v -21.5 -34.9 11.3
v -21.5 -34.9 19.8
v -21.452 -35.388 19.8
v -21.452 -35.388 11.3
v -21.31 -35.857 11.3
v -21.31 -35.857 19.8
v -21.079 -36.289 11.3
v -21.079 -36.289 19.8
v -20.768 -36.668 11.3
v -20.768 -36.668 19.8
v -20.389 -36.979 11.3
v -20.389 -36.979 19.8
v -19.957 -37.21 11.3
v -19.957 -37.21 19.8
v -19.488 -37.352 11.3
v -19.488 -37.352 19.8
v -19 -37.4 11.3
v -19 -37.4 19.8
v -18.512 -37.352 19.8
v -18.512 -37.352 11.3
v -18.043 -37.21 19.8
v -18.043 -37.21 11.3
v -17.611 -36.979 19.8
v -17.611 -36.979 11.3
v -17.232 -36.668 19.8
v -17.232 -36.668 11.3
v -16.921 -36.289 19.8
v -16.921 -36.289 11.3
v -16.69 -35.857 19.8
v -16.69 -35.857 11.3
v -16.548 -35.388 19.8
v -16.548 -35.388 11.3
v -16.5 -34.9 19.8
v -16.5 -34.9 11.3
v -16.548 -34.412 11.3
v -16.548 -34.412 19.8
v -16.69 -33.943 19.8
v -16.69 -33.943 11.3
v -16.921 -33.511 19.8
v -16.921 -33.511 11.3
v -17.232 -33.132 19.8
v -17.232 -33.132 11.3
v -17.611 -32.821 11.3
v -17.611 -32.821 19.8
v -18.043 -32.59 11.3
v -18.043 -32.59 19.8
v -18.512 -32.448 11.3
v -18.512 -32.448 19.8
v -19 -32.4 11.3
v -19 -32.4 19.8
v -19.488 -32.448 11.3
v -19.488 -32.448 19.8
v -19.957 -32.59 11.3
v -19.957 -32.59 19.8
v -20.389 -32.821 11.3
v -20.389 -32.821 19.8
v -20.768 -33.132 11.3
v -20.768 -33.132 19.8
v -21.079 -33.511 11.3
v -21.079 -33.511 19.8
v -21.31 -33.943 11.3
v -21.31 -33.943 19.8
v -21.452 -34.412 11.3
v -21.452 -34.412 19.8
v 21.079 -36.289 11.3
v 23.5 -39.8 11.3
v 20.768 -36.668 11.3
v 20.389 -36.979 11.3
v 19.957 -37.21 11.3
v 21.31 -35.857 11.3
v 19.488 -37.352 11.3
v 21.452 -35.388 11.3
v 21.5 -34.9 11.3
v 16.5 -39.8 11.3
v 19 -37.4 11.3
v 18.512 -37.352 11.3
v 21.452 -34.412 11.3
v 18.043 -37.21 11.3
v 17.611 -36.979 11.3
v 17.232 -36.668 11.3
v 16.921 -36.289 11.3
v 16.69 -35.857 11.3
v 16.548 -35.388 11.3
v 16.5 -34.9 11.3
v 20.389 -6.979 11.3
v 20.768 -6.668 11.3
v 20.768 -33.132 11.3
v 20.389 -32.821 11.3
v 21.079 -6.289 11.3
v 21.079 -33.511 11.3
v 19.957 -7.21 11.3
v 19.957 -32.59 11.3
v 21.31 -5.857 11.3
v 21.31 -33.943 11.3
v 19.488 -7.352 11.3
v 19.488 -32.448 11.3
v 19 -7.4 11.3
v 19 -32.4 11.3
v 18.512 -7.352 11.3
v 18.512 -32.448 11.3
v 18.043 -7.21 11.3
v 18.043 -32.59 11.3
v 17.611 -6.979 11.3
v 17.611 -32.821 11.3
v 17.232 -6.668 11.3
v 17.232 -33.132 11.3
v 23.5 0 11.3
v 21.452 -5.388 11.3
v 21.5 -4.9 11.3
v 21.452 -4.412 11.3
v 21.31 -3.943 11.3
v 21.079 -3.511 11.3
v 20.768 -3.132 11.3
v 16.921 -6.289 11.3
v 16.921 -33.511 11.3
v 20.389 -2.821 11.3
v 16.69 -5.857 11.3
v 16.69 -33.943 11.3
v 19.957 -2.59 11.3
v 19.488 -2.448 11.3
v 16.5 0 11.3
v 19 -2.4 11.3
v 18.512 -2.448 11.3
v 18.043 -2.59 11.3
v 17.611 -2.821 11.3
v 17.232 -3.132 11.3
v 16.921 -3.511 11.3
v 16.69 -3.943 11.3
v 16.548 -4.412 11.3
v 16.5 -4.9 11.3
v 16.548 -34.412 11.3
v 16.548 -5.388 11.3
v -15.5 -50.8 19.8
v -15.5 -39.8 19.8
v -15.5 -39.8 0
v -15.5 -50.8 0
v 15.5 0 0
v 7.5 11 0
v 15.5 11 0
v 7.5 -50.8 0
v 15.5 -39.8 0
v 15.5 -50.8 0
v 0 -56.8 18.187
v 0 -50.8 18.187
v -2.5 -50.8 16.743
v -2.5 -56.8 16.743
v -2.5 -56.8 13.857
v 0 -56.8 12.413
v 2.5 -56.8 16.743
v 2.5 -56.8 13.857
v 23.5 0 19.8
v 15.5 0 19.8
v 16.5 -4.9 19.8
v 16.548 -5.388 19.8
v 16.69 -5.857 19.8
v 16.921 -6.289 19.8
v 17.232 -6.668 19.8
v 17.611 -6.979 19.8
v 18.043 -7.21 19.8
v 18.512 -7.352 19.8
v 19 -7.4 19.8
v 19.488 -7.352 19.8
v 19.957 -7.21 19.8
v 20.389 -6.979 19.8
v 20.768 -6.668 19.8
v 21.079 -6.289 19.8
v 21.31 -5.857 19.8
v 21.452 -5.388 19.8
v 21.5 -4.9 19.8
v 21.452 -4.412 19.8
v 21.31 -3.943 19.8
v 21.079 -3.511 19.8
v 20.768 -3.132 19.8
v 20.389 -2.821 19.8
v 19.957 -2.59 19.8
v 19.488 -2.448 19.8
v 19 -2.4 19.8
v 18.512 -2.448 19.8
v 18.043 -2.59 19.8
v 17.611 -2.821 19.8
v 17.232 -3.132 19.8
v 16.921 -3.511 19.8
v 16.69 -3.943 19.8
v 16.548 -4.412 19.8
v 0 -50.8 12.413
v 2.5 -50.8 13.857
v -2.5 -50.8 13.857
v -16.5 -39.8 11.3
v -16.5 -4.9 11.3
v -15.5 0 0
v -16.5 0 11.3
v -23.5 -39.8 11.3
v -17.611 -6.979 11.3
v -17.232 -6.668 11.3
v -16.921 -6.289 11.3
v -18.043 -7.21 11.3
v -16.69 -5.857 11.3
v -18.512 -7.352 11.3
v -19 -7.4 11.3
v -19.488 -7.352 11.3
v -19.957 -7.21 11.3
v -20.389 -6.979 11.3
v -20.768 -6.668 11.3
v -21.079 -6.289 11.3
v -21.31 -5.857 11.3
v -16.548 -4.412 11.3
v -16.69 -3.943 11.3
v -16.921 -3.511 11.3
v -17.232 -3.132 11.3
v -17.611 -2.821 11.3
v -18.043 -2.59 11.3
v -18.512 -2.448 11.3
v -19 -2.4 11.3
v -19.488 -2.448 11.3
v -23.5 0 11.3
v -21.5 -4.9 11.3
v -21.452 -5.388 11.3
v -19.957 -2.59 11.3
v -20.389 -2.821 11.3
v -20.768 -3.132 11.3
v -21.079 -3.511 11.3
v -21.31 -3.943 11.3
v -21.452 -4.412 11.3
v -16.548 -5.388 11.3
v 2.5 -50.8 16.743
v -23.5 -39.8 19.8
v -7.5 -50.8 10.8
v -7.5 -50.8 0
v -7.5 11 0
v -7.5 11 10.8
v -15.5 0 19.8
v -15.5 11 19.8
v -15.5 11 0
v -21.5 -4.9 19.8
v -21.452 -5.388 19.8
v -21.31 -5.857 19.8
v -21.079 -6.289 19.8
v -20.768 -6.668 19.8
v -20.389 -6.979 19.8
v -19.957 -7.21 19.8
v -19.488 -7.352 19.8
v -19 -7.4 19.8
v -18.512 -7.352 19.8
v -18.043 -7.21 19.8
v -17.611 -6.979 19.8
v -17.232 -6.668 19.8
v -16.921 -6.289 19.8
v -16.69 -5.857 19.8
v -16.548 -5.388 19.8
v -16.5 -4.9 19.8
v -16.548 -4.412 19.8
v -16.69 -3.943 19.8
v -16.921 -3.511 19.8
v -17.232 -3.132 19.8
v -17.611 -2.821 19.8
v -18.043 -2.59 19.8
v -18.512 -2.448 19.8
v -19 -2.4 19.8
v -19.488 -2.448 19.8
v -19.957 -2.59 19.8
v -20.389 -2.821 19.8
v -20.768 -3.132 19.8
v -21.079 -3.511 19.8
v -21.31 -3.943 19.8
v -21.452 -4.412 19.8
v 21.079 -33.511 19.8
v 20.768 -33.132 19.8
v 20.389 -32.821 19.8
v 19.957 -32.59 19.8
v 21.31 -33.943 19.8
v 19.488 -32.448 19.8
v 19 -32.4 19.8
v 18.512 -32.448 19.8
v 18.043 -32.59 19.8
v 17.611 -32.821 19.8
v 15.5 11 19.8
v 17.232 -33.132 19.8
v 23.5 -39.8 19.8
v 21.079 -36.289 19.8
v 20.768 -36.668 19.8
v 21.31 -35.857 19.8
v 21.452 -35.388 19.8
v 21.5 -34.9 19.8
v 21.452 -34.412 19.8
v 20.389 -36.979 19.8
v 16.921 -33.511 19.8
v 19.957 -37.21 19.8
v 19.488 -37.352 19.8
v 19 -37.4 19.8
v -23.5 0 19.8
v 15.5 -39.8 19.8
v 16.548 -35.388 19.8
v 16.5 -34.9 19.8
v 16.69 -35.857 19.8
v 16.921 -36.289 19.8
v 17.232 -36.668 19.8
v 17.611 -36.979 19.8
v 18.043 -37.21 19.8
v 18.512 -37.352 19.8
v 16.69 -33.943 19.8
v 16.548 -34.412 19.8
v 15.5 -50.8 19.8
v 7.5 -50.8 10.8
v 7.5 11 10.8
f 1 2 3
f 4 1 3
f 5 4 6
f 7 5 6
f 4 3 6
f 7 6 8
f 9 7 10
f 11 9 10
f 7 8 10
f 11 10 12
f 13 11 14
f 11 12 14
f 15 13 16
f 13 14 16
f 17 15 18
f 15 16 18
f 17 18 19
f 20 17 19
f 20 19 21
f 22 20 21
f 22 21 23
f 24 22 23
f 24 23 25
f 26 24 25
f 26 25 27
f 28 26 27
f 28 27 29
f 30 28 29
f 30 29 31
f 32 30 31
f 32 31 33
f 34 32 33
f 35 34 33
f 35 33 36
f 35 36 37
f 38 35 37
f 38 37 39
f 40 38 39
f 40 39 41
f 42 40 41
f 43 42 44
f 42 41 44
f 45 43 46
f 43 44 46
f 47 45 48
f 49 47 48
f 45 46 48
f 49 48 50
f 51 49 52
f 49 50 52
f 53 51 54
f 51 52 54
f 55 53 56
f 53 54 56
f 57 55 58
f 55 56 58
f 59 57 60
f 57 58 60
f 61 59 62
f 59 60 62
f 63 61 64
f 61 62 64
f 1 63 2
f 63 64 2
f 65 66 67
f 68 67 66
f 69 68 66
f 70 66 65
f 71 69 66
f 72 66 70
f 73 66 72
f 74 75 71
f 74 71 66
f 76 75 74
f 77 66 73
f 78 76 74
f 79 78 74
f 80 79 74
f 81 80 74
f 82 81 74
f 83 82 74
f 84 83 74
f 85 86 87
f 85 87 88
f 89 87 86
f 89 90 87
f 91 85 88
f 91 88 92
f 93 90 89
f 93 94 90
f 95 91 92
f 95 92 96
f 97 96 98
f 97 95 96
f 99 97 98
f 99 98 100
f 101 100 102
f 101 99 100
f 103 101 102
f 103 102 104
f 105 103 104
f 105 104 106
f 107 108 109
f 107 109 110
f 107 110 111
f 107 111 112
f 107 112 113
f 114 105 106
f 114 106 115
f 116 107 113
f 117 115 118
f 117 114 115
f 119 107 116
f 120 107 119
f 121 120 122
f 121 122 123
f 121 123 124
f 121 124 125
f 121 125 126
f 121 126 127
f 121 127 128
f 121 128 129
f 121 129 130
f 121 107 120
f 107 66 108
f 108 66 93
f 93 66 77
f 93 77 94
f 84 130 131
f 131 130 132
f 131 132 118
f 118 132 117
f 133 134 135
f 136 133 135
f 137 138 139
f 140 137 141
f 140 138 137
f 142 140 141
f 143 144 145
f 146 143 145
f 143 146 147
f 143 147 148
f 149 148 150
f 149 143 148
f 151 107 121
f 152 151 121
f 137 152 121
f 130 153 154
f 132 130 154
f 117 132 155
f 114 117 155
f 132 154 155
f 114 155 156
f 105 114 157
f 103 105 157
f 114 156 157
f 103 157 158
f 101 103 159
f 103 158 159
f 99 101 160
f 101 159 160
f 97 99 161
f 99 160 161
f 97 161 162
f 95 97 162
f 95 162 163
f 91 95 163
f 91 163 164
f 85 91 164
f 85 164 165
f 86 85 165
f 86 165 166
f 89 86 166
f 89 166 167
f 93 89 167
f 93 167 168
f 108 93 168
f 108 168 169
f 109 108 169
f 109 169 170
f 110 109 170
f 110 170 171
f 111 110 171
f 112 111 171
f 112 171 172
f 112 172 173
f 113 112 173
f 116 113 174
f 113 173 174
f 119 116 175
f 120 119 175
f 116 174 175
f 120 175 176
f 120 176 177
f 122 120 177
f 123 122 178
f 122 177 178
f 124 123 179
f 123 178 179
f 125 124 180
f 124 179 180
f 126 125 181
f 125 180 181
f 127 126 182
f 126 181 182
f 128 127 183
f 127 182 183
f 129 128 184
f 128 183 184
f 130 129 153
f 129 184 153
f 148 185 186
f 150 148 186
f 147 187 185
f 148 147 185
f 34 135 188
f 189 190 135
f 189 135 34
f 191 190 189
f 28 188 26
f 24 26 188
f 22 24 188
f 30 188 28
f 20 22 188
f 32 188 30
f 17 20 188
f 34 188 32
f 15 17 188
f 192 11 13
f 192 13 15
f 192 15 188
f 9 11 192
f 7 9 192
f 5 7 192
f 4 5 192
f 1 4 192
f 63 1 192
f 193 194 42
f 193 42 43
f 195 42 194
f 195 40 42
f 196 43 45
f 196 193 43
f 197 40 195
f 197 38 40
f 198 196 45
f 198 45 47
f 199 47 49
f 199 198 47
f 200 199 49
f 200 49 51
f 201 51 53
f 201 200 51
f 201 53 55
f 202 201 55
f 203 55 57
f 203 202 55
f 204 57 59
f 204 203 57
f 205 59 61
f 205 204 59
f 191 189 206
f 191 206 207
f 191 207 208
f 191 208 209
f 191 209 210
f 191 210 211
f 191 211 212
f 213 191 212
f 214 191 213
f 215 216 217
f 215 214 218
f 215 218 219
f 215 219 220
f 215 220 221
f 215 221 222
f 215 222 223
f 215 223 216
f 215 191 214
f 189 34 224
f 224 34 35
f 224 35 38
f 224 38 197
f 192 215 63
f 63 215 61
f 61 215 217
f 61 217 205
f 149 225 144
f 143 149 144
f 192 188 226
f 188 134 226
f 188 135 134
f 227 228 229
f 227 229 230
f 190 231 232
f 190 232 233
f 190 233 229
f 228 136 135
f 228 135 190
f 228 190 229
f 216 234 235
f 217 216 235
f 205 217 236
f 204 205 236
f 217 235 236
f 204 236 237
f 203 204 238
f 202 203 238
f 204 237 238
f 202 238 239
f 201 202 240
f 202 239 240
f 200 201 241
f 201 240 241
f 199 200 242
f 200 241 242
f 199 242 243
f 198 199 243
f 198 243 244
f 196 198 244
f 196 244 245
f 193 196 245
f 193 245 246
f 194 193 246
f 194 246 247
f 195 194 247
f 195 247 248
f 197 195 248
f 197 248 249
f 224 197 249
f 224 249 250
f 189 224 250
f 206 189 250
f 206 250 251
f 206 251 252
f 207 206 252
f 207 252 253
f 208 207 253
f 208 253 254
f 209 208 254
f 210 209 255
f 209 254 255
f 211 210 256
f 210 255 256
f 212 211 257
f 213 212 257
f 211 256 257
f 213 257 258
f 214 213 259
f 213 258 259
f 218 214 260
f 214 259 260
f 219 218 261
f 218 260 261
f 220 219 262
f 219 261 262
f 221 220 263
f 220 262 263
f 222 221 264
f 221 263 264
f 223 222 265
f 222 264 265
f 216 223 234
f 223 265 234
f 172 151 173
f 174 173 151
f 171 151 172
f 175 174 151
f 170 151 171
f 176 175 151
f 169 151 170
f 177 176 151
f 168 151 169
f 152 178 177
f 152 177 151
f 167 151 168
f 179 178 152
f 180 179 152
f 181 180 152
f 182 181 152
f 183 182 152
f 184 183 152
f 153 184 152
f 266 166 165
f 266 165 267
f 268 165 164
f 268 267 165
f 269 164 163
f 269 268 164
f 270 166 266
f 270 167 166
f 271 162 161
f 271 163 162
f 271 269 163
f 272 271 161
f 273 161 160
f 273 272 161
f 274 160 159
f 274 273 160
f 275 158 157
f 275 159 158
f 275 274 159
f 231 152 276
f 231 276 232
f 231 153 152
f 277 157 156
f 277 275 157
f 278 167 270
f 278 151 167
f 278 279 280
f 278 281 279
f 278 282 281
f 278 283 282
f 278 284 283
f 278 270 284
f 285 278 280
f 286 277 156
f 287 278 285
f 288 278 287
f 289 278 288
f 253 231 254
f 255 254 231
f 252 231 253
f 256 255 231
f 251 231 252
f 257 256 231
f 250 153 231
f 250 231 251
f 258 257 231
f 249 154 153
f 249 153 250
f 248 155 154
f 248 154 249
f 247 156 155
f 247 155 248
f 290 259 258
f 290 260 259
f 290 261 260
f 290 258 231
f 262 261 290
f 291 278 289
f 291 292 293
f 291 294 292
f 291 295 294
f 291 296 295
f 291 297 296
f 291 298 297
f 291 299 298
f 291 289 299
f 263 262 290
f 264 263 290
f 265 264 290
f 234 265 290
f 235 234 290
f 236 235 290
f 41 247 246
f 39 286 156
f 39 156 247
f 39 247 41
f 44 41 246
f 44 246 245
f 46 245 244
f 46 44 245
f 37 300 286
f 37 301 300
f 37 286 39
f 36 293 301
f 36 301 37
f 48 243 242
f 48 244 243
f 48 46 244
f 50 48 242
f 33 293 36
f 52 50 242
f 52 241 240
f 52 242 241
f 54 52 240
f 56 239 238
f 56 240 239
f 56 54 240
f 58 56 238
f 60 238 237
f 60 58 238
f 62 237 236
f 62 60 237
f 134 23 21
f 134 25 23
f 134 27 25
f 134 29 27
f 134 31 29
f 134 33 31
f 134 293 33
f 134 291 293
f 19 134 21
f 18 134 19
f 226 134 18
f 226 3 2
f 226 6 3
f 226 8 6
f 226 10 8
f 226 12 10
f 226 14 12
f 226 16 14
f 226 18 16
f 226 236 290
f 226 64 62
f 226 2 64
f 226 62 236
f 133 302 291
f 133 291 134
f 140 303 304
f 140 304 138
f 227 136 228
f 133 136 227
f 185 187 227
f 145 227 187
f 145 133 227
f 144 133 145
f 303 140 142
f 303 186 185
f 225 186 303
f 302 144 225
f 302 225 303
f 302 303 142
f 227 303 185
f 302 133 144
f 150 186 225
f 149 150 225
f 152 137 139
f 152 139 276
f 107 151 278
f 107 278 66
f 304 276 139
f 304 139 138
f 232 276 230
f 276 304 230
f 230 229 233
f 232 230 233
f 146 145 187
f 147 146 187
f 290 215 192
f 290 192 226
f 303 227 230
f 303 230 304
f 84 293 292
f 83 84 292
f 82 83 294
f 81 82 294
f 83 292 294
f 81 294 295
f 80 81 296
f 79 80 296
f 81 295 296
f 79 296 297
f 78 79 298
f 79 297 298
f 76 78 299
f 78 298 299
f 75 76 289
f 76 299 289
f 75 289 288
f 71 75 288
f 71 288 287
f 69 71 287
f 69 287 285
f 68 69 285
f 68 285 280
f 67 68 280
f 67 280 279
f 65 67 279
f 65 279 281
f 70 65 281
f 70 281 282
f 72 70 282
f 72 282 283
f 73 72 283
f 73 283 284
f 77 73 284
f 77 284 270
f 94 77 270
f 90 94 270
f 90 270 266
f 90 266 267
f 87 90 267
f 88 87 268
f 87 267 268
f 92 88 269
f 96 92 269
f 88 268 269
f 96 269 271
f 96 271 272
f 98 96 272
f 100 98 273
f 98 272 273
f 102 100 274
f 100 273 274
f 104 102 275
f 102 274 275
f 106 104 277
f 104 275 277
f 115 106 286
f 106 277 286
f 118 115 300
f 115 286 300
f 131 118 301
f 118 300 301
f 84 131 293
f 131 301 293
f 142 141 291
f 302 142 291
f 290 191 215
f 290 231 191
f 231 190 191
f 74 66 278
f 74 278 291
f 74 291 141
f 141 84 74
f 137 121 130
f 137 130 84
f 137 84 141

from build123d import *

# Parameters (mm, degrees)
PAD_DEPTH    = 39.8
PAD001_DEPTH = 11
PAD002_DEPTH = 11
PAD003_DEPTH = 6
SKETCH004_R  = 2.5
POCKET_DEPTH = 19.801


with BuildPart() as part:
    # Sketch → Pad (new body)
    with BuildSketch(Plane.XZ):
        Polygon((-23.5, 19.8), (23.5, 19.8), (23.5, 11.3), (16.5, 11.3), (15.5, 0), (7.5, 0), (7.5, 10.8), (-7.5, 10.8), (-7.5, 0), (-15.5, 0), (-16.5, 11.3), (-23.5, 11.3), align=None)
    extrude(amount=PAD_DEPTH)

    # Sketch001 (on Face14 of Pad) → Pad001 (join)
    with BuildSketch(Plane.XZ.offset(39.8)):
        Polygon((-15.5, 0), (-7.5, 0), (-7.5, 10.8), (7.5, 10.8), (7.5, 0), (15.5, 0), (15.5, 19.8), (-15.5, 19.8), align=None)
    extrude(amount=PAD001_DEPTH)

    # Sketch002 (on Face4 of Pad001) → Pad002 (join)
    with BuildSketch(Plane(origin=(0, 0, 0), x_dir=(1, 0, 0), z_dir=(0, 1, 0))):
        Polygon((-15.5, 0), (-7.5, 0), (-7.5, -10.8), (7.5, -10.8), (7.5, 0), (15.5, 0), (15.5, -19.8), (-15.5, -19.8), align=None)
    extrude(amount=PAD002_DEPTH)

    # Sketch003 (on Face19 of Pad002) → Pad003 (join)
    with BuildSketch(Plane.XZ.offset(50.8)):
        Polygon((0, 12.413249), (2.5, 13.856624), (2.5, 16.743376), (0, 18.186751), (-2.5, 16.743376), (-2.5, 13.856624), align=None)
    extrude(amount=PAD003_DEPTH)

    # Sketch004 (on Face1 of Pad003) → Pocket (cut, through all)
    with BuildSketch(Plane(origin=(0, 0, 19.8), x_dir=(-1, 0, 0), z_dir=(0, 0, 1))):
        with Locations((-19, 34.9)):
            Circle(SKETCH004_R)
        with Locations((-19, 4.9)):
            Circle(SKETCH004_R)
        with Locations((19, 4.9)):
            Circle(SKETCH004_R)
        with Locations((19, 34.9)):
            Circle(SKETCH004_R)
    extrude(amount=-POCKET_DEPTH, mode=Mode.SUBTRACT)


solid = part.part
